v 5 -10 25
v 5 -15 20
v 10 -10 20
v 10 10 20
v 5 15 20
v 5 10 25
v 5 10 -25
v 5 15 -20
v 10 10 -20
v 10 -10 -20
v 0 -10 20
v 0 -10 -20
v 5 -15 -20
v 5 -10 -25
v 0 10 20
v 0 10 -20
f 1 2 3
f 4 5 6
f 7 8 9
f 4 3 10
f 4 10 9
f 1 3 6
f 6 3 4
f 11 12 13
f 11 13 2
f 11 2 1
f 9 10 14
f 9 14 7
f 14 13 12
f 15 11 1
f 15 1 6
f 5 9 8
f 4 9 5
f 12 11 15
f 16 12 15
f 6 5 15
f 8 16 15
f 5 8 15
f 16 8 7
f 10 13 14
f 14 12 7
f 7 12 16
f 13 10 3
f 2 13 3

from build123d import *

# Parameters (mm, degrees)
F0_W     = 30
F0_H     = 50
F1_DEPTH = 10
F2_SIZE  = 4.99999


# Not quite as in the source:
# - a fillet or chamfer is up to 0.001 mm smaller than in the source, because OpenCascade refuses the exact size


with BuildPart() as f1:
    # F0 (on Right) → F1 (new body)
    with BuildSketch(Plane.YZ):
        Rectangle(F0_W, F0_H)
    extrude(amount=F1_DEPTH)

    # F2 (size 5 in the source; OpenCascade refuses exactly that, so slightly less here)
    f2_edges = [f1.edges().sort_by_distance(p)[0] for p in [
        (5, -15, 25),
        (5, -15, -25),
        (0, -15, 0),
        (10, -15, 0),
        (5, 15, -25),
        (5, 15, 25),
        (0, 15, 0),
        (10, 15, 0),
        (10, 0, 25),
        (10, 0, -25),
        (0, 0, 25),
        (0, 0, -25),
    ]]
    chamfer(f2_edges, length=F2_SIZE)


solid = f1.part
